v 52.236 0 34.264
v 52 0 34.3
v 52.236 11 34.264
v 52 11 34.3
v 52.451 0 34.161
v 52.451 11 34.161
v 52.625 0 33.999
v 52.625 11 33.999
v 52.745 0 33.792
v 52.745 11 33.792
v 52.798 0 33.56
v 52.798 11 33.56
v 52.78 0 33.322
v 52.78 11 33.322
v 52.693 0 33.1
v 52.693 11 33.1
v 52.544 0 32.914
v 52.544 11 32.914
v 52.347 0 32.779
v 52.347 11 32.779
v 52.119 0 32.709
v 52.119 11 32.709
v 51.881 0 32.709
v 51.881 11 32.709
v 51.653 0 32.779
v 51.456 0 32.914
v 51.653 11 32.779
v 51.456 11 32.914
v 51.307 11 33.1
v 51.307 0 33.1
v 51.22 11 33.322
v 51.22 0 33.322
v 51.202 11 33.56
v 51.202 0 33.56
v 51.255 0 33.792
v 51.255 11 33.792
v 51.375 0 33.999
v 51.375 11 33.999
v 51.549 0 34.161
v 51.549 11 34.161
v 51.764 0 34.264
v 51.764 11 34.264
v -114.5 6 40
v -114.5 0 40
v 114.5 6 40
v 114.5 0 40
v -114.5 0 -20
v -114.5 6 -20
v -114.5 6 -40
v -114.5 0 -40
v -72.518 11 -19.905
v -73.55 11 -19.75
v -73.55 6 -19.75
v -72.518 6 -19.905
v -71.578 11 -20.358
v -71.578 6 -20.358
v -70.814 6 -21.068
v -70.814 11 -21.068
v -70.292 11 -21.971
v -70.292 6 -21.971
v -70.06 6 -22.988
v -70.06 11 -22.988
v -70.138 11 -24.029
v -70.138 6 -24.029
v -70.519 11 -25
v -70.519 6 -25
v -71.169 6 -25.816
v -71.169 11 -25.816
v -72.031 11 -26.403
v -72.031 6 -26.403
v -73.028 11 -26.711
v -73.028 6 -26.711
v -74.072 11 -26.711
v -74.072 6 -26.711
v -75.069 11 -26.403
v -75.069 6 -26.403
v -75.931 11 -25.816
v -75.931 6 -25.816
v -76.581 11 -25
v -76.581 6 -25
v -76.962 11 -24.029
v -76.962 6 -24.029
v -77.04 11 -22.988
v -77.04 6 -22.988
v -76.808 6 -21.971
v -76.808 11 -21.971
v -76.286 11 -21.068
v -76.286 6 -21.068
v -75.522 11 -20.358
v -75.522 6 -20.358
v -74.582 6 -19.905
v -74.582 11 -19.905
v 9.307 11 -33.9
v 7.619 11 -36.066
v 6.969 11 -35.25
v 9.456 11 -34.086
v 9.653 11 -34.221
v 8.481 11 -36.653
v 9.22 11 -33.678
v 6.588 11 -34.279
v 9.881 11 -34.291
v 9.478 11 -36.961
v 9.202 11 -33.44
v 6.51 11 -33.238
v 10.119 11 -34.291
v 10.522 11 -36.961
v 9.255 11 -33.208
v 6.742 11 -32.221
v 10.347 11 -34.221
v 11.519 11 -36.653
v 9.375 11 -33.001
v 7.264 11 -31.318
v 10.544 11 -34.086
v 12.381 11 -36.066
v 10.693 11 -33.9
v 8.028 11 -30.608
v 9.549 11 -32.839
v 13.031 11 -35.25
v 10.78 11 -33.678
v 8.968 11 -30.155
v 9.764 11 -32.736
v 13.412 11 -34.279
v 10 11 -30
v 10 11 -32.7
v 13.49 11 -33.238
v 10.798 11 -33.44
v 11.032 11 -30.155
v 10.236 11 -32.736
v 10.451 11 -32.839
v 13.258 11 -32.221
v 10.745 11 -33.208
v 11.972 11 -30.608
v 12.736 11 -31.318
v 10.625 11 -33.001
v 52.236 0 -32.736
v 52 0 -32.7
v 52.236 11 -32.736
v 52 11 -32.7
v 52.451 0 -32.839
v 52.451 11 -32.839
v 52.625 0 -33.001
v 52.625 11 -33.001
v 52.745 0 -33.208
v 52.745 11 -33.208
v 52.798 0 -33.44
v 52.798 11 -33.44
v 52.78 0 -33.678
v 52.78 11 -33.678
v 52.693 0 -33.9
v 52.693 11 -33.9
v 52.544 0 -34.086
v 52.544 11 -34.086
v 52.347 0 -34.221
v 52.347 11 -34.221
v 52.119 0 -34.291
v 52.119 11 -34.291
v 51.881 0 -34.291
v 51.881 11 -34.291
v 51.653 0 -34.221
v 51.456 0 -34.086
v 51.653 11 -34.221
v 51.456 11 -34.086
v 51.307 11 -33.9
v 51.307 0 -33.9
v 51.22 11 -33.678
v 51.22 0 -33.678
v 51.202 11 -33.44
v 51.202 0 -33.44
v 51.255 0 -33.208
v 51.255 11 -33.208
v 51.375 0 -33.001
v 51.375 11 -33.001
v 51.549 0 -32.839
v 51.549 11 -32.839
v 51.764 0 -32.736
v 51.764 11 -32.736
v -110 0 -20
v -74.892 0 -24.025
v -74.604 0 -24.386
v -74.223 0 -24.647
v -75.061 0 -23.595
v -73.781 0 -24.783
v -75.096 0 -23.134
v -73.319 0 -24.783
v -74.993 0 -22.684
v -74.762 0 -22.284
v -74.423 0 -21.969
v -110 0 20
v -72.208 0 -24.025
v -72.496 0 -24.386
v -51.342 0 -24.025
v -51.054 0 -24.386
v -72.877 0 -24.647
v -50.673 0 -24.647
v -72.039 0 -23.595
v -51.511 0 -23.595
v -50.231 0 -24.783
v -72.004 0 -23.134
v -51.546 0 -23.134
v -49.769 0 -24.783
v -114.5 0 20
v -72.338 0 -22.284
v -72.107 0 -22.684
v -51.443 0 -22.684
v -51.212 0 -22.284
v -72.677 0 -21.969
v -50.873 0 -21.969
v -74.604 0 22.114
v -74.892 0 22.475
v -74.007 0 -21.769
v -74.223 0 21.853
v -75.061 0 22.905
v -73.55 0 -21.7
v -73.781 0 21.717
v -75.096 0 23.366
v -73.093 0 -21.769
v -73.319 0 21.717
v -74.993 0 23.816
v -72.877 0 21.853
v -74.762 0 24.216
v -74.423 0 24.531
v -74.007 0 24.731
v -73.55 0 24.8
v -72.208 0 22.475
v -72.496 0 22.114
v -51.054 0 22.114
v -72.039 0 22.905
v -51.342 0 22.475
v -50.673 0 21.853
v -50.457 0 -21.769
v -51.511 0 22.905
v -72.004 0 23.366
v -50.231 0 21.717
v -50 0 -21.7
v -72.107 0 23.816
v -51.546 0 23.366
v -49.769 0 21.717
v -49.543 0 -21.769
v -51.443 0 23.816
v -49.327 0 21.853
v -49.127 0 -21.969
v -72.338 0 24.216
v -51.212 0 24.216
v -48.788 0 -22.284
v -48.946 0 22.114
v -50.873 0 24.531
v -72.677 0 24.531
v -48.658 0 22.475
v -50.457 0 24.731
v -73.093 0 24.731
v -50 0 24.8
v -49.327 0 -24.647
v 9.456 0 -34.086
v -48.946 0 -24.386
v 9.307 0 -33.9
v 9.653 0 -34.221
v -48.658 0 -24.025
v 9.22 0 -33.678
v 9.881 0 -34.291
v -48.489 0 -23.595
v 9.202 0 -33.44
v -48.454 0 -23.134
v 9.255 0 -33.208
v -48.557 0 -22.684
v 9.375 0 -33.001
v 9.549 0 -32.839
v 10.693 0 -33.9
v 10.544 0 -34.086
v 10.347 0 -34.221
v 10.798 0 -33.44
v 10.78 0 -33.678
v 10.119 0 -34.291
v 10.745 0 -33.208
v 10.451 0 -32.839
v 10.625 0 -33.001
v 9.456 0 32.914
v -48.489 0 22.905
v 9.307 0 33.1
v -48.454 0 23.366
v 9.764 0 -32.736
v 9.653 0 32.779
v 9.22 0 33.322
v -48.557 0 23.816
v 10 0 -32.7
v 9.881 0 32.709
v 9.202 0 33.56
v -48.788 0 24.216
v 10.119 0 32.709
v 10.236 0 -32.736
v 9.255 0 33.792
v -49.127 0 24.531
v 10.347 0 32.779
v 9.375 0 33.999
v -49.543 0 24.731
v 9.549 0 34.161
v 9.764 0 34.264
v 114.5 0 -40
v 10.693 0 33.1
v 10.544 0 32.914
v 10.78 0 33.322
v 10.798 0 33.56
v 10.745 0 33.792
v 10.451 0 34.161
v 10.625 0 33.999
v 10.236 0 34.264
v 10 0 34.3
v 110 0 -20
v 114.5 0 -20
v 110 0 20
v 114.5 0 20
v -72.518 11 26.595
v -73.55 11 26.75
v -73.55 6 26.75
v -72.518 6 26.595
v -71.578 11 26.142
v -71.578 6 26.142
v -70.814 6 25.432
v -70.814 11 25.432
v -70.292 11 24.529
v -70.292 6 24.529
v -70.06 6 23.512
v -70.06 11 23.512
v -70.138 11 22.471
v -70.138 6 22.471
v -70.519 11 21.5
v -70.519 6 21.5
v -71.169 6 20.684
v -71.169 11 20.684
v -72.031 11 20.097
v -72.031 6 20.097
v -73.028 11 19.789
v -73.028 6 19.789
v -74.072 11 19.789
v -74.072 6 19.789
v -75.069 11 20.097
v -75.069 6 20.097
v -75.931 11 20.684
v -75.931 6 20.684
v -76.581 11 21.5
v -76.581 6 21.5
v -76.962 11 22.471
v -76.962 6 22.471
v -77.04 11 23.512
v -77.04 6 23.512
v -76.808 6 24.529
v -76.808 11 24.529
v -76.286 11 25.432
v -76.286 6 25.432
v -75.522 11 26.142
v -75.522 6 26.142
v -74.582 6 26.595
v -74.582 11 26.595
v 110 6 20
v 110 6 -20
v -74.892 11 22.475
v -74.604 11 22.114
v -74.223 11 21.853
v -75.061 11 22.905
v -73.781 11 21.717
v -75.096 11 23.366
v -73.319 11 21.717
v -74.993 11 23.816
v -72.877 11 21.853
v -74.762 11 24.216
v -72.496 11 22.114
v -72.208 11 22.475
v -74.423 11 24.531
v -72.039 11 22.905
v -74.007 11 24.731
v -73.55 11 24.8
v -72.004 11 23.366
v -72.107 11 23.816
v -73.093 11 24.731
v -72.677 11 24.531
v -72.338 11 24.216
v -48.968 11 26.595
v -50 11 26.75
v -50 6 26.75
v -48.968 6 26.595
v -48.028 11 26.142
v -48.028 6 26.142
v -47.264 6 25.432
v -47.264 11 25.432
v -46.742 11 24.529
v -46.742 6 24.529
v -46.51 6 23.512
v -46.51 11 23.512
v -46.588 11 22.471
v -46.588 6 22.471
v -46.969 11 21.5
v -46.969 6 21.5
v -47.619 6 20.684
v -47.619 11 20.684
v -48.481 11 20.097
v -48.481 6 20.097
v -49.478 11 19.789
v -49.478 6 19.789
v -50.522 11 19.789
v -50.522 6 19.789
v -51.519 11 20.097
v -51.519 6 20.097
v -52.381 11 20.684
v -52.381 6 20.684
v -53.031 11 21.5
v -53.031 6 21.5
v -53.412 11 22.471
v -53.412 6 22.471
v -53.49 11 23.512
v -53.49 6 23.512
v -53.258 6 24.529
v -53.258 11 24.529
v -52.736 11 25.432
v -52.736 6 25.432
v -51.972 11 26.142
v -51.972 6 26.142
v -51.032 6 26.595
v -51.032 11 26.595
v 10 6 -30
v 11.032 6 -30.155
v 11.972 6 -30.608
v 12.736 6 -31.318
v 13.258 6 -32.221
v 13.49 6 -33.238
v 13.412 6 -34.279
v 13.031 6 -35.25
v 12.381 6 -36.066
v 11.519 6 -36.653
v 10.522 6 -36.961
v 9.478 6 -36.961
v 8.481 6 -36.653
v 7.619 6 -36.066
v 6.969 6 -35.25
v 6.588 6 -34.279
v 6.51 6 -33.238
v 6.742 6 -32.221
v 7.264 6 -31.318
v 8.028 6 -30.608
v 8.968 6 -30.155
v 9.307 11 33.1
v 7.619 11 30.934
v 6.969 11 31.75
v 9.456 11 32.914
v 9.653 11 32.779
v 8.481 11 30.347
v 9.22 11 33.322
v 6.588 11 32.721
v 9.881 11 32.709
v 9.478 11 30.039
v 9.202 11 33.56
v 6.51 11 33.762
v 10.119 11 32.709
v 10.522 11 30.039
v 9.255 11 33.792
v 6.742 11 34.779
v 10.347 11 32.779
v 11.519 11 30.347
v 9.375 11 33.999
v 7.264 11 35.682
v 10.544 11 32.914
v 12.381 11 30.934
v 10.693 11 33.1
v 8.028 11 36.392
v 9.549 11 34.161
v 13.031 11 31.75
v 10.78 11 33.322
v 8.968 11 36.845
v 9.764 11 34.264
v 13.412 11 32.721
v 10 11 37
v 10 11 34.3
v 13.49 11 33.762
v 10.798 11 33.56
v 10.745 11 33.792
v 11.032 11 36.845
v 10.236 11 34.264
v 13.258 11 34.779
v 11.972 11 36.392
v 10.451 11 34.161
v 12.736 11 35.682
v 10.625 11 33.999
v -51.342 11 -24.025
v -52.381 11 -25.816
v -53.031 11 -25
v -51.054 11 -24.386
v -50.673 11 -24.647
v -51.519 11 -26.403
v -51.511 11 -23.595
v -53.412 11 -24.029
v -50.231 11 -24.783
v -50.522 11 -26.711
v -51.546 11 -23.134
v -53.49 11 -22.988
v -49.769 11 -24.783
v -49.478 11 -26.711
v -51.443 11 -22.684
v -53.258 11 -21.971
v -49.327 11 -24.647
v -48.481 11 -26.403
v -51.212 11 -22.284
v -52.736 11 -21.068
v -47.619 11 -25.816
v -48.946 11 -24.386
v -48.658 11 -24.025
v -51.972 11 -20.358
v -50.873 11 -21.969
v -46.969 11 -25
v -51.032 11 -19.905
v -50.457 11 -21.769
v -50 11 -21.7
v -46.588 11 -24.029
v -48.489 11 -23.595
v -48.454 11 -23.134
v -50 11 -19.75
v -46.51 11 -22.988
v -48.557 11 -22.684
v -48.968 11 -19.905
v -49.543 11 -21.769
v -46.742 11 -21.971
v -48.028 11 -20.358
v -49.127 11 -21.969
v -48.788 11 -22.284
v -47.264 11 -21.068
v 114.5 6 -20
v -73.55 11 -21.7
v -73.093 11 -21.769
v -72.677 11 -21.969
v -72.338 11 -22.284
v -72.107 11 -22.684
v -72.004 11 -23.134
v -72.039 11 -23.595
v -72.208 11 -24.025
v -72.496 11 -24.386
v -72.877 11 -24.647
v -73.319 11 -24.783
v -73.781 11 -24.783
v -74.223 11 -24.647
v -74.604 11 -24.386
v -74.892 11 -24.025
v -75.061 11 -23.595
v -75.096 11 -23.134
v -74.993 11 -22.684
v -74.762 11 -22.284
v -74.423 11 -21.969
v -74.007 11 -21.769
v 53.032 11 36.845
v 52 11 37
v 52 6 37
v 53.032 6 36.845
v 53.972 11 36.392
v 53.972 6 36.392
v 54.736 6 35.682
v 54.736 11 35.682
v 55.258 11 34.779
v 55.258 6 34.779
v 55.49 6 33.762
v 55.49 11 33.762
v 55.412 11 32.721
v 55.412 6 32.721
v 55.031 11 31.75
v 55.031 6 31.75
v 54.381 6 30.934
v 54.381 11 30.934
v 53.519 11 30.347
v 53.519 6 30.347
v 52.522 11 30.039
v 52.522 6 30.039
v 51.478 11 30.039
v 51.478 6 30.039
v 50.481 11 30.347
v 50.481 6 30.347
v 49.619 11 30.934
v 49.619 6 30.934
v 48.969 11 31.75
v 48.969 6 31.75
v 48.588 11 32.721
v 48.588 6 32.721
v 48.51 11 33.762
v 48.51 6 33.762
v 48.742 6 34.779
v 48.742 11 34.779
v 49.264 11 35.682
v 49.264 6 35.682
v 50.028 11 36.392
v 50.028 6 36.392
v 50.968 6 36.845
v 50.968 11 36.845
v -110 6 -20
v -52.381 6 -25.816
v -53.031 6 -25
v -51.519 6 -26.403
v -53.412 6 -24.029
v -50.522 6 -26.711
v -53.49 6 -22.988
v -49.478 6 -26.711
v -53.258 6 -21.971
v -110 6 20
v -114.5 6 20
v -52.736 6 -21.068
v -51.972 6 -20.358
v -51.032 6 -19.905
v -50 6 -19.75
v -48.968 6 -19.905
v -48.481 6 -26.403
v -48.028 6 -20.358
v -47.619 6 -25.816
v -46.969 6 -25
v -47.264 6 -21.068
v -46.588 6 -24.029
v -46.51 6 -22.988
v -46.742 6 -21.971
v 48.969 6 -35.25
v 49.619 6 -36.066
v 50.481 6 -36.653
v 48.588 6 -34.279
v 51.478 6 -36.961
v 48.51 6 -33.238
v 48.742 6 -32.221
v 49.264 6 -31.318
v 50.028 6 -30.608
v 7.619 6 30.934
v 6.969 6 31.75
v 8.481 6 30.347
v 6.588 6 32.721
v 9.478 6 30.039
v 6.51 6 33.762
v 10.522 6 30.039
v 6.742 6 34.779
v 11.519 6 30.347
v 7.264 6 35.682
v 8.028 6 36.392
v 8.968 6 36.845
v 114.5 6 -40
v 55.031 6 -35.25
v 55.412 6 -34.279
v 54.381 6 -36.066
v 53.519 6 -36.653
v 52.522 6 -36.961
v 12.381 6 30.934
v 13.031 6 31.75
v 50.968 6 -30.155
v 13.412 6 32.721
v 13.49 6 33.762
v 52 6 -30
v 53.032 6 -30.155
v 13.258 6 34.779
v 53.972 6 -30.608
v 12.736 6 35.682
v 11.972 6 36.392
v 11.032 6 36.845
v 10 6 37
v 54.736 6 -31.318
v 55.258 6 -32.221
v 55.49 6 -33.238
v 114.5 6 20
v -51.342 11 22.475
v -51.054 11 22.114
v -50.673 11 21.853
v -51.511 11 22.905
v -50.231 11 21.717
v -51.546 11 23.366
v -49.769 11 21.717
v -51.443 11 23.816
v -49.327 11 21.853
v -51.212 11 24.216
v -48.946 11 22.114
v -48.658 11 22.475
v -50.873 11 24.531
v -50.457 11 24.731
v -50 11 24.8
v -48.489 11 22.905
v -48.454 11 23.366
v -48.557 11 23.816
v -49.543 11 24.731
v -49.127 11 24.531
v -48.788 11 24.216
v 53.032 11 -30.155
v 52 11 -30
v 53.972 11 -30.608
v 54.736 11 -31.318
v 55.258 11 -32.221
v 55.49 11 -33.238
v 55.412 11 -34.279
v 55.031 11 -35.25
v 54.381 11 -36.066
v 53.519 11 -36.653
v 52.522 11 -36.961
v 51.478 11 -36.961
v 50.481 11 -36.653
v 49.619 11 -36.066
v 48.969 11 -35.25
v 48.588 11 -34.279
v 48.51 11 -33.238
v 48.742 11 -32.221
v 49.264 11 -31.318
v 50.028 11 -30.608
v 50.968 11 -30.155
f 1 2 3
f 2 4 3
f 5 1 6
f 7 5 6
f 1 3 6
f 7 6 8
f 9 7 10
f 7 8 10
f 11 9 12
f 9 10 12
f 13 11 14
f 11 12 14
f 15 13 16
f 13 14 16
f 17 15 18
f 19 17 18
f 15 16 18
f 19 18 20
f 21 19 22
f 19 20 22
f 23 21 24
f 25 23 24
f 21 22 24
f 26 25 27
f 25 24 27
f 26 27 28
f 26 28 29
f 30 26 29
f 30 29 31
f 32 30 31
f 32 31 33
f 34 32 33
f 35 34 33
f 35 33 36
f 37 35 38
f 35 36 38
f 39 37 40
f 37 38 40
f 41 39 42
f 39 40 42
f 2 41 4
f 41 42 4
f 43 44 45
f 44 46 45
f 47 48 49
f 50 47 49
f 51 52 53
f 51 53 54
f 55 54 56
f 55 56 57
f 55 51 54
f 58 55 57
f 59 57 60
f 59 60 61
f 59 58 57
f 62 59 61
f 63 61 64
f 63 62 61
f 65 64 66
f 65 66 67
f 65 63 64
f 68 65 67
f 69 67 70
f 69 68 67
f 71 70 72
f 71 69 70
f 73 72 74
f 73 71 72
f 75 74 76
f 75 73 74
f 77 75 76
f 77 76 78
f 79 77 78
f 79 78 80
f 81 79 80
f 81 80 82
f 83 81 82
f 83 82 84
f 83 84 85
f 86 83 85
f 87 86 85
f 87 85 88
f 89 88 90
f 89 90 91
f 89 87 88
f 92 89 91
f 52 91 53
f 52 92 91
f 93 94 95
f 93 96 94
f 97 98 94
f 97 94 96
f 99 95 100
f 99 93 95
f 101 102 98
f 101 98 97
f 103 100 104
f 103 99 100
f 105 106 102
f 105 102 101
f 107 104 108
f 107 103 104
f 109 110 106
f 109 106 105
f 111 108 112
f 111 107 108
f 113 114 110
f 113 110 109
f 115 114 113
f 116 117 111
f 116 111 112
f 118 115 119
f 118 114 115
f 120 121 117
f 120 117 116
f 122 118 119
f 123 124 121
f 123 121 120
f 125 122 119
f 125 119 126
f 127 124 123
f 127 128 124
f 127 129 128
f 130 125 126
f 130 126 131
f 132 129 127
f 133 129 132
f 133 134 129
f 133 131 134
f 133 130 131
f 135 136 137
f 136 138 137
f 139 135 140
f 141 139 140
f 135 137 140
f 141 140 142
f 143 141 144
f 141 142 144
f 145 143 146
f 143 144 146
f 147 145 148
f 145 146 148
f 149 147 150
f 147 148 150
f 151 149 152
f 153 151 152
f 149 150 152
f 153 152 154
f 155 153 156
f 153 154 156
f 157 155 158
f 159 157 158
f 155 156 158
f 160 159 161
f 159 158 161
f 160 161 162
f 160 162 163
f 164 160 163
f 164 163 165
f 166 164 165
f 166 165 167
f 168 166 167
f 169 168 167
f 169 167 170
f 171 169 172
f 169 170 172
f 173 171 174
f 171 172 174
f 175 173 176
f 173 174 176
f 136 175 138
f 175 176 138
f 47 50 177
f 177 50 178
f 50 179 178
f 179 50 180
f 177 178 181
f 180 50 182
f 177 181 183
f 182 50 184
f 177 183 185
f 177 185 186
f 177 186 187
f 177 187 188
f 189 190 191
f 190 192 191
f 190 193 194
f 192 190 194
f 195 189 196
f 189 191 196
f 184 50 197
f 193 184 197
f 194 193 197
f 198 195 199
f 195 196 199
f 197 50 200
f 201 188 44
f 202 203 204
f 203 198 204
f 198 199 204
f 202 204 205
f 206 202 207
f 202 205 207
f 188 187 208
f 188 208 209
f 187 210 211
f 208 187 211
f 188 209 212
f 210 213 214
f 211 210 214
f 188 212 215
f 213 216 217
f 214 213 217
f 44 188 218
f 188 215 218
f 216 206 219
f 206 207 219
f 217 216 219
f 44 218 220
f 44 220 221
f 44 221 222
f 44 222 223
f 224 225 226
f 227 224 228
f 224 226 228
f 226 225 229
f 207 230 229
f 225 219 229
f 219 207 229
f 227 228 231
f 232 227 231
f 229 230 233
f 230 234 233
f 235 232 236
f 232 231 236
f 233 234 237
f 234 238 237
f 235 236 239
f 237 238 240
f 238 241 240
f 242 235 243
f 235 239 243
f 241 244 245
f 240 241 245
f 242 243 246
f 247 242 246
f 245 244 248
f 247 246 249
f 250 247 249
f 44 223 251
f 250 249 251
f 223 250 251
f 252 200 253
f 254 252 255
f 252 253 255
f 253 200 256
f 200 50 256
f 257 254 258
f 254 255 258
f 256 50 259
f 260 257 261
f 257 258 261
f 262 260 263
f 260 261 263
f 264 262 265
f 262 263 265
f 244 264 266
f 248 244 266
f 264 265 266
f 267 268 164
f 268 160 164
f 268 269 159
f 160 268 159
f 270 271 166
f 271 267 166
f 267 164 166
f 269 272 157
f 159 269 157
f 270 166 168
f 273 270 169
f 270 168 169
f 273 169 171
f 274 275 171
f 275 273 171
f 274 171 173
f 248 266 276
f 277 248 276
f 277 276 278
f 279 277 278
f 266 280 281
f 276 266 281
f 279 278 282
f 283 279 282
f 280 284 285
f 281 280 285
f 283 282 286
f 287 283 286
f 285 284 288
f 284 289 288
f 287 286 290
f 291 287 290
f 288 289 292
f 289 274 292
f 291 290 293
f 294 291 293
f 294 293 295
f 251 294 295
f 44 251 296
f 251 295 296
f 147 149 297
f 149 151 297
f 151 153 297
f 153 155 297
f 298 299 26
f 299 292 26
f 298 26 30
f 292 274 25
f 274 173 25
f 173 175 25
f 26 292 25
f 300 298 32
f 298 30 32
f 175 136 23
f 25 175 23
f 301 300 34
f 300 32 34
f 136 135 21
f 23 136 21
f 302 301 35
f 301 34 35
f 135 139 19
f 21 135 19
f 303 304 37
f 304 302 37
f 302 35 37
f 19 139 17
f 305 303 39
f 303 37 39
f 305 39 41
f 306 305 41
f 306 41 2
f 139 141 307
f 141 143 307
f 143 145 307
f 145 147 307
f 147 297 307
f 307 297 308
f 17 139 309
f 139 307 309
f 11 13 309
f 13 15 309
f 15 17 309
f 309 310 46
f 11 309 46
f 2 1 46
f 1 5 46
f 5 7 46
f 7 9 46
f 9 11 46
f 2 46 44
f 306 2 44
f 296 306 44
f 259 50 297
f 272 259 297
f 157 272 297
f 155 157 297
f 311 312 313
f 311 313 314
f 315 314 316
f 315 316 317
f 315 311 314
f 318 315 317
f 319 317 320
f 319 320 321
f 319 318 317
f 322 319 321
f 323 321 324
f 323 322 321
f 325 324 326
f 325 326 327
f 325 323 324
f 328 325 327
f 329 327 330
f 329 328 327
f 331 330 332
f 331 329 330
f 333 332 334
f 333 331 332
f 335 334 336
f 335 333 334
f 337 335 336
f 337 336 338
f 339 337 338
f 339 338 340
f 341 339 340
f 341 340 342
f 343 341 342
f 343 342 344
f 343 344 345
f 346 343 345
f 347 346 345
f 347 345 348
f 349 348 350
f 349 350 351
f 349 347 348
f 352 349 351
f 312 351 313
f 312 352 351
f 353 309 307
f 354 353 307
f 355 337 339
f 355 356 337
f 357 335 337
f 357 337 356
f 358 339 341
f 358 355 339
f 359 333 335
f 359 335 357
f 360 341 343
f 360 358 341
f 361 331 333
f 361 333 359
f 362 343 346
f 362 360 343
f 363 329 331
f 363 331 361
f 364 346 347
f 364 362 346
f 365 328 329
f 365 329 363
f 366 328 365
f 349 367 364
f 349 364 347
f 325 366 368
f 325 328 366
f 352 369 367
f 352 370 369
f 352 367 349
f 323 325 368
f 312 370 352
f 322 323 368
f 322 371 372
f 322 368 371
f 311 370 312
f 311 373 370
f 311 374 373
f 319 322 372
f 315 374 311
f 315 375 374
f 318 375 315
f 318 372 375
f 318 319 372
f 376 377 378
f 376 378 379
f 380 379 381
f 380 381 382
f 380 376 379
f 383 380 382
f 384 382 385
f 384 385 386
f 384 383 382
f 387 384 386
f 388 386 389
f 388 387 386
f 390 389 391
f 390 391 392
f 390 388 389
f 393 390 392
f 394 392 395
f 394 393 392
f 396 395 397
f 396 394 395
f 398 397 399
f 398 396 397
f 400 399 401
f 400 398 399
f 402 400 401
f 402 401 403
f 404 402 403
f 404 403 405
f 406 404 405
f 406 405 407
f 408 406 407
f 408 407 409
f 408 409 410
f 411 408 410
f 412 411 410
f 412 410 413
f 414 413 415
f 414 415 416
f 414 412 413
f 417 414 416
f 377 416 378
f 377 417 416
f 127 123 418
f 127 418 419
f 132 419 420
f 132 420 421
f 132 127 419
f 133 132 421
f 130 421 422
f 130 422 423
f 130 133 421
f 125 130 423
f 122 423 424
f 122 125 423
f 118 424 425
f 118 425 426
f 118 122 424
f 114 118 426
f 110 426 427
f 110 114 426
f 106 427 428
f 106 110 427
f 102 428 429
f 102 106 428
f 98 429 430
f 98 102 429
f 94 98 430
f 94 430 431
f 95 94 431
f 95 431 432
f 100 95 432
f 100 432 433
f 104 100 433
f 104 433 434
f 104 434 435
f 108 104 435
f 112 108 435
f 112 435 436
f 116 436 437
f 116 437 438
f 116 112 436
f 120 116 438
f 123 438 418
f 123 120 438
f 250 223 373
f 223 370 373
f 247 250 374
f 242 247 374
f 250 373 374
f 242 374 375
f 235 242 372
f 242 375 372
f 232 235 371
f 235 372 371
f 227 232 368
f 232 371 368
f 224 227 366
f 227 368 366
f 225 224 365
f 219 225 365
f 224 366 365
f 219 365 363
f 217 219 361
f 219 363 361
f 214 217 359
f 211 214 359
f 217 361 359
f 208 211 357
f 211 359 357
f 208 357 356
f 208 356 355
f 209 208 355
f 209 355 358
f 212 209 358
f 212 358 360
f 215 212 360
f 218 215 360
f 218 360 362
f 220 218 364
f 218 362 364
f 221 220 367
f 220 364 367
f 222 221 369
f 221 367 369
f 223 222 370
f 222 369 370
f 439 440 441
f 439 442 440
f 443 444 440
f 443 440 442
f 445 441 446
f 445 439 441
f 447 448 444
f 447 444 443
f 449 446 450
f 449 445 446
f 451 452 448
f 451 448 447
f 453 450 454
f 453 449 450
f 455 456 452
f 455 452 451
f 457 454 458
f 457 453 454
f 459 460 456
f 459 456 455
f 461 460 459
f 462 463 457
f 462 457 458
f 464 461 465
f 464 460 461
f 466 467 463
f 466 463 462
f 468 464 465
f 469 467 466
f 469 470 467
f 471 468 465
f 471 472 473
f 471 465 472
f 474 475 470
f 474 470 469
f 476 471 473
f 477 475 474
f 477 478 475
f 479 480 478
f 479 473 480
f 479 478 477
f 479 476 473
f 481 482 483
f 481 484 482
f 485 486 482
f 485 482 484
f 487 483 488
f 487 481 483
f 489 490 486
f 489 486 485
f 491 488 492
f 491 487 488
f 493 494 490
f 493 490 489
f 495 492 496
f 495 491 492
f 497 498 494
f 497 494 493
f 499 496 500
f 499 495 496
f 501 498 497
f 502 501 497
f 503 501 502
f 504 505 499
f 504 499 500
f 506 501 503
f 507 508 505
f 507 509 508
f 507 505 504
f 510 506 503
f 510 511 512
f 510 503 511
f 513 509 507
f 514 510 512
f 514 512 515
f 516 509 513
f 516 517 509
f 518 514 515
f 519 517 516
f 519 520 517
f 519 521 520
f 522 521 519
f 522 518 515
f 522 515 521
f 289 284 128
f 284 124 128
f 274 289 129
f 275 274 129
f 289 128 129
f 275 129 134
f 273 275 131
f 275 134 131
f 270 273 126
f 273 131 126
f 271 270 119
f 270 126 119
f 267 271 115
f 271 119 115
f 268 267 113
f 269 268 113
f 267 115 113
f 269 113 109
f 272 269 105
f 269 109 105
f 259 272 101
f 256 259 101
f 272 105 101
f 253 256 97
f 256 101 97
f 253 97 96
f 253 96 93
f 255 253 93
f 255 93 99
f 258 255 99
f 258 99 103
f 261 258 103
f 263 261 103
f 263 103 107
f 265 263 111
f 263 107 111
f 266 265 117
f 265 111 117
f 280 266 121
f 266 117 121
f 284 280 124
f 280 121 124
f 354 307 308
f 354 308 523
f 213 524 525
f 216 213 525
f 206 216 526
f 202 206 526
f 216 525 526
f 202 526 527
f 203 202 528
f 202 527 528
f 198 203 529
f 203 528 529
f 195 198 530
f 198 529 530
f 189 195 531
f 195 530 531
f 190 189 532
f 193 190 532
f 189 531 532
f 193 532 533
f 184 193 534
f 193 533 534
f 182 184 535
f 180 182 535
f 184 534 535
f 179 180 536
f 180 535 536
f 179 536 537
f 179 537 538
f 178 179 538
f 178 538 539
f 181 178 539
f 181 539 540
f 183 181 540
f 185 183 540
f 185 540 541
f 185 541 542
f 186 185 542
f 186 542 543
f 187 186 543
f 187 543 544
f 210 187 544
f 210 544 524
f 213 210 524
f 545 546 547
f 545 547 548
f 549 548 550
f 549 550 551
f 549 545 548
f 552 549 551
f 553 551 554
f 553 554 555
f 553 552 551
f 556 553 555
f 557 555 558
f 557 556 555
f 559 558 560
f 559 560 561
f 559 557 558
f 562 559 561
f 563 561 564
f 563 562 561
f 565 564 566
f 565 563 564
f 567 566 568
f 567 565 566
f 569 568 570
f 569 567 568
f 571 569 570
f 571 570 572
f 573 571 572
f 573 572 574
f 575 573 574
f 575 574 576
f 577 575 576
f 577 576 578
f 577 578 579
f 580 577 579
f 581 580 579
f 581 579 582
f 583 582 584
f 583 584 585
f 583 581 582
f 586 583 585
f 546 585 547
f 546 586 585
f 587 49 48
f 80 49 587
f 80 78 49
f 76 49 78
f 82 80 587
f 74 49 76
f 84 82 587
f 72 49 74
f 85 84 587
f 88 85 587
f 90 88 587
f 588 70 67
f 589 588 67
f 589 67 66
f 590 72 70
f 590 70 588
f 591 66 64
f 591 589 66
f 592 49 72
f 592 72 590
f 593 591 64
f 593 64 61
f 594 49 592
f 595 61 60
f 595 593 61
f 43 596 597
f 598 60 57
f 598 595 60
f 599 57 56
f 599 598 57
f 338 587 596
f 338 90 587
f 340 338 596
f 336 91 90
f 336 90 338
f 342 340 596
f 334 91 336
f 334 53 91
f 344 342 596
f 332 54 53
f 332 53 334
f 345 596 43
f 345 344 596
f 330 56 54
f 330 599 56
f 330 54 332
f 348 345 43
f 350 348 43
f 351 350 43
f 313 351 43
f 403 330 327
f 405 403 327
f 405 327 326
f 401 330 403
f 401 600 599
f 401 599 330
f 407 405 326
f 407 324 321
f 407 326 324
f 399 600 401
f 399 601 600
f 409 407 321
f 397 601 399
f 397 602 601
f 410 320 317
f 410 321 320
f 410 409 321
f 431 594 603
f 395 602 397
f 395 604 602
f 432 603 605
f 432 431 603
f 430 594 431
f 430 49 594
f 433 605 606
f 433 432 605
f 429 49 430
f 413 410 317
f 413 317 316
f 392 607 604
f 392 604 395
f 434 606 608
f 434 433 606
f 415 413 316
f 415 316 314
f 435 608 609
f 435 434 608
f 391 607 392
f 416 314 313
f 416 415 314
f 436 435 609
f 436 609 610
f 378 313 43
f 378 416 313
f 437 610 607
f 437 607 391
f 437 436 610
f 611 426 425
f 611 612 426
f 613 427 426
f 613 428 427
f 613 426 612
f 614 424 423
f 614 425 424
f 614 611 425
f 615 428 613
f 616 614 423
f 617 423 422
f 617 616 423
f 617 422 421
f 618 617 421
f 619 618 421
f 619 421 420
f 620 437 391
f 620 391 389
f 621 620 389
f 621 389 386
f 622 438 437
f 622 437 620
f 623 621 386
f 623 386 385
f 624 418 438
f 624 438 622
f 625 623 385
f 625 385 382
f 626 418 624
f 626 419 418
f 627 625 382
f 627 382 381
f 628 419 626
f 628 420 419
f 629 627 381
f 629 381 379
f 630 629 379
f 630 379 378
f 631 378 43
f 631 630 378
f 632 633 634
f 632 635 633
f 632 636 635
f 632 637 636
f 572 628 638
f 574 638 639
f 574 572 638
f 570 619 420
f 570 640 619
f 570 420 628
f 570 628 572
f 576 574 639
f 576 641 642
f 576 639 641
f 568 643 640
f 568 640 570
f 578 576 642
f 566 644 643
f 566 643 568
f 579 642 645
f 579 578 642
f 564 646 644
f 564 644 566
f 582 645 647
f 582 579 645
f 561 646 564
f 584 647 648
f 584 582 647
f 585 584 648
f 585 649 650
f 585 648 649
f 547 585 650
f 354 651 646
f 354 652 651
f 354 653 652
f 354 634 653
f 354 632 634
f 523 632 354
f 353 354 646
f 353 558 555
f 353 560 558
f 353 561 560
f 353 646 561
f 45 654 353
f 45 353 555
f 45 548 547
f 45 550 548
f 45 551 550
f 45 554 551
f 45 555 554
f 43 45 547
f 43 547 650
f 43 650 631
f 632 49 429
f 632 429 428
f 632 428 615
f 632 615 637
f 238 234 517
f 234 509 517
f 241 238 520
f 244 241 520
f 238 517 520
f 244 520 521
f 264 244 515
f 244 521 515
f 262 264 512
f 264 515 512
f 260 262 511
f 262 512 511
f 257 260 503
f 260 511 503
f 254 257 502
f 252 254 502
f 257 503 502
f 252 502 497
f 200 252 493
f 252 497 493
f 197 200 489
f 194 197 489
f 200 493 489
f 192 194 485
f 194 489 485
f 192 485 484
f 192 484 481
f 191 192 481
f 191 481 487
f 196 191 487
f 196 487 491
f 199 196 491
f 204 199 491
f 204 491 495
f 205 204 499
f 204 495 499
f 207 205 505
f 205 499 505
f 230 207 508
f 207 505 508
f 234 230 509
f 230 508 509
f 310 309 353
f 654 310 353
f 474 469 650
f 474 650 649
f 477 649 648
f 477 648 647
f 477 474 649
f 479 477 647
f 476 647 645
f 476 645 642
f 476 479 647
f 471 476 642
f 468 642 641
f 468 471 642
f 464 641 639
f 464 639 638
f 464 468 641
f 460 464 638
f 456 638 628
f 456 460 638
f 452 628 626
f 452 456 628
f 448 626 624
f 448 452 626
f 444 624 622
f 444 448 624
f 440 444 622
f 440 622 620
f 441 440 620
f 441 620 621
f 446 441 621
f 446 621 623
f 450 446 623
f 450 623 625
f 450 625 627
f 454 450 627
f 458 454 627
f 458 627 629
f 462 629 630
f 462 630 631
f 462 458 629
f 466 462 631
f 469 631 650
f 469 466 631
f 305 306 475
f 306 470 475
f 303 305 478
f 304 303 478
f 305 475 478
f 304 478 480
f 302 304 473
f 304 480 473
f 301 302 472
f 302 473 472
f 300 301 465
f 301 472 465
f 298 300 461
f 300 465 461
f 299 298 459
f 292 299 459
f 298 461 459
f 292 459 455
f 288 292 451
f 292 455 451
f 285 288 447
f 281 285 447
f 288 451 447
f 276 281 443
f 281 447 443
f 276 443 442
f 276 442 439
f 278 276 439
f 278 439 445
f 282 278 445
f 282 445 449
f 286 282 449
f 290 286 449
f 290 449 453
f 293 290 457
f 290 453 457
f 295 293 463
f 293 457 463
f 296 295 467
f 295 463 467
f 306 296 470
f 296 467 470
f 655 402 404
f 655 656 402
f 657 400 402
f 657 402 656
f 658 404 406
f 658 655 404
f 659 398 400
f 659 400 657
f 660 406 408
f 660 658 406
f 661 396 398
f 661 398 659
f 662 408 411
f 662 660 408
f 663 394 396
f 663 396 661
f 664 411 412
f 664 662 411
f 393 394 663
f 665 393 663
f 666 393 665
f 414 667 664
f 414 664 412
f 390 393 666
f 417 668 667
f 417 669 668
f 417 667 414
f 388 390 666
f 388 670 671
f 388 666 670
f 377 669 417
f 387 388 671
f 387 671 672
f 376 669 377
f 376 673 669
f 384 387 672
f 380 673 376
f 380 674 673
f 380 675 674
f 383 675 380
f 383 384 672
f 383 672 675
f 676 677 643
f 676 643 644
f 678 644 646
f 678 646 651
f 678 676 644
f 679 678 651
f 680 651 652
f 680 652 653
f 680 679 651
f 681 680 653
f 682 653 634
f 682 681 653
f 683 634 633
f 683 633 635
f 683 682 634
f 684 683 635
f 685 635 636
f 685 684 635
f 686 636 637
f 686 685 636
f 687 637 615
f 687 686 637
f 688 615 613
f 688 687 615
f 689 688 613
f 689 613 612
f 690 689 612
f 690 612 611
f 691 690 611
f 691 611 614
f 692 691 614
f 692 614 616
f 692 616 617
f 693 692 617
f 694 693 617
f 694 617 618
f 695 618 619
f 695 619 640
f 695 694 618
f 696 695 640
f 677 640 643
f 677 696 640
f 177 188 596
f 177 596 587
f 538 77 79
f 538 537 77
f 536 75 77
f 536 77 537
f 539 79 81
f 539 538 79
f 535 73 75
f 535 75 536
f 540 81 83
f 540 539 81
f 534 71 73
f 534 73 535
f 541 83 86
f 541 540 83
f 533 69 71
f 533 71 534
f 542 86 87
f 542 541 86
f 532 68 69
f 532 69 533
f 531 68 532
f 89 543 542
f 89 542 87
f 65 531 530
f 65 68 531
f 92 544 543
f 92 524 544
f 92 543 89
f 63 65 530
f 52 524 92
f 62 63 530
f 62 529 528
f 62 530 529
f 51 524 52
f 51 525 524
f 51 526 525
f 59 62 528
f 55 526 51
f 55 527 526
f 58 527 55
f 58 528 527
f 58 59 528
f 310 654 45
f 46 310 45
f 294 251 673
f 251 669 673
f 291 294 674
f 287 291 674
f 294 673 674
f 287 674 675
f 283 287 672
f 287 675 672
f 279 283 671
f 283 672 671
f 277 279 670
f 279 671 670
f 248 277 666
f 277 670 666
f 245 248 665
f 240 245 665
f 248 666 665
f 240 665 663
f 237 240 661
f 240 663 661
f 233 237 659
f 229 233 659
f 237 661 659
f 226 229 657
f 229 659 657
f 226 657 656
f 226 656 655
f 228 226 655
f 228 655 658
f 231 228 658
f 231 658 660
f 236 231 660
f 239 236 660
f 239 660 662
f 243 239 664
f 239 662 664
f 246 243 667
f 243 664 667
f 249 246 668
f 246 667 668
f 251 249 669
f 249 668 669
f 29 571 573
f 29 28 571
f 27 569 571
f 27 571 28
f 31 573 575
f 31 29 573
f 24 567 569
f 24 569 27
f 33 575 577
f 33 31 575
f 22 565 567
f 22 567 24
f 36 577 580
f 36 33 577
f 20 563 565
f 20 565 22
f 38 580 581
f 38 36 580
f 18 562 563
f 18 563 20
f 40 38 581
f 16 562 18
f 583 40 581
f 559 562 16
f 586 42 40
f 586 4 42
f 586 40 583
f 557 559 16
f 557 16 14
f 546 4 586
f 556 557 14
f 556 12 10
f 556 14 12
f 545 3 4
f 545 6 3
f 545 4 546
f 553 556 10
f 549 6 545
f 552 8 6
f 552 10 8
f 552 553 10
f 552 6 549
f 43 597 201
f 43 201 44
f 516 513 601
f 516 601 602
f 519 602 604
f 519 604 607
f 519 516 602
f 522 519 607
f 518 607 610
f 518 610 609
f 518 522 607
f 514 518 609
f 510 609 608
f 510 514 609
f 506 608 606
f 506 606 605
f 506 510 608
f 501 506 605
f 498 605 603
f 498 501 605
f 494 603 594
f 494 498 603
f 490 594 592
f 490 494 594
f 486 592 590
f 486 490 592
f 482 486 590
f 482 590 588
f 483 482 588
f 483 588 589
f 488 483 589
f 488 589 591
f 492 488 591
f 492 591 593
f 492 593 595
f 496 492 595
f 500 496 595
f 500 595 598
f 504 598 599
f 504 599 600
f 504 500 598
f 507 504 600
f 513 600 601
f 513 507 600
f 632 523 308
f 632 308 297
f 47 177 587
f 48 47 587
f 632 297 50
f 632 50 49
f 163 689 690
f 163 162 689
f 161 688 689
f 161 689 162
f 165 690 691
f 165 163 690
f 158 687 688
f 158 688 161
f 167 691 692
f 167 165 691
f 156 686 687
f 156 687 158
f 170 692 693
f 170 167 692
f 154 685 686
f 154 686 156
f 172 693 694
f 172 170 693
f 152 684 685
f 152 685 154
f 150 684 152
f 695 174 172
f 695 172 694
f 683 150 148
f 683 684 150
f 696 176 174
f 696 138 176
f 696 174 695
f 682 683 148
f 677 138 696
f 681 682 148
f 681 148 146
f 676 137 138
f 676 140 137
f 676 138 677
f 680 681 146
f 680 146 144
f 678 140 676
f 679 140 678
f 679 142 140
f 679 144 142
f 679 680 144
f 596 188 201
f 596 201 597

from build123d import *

# Parameters (mm, degrees)
SKETCH2_W                                  = 220
SKETCH2_H                                  = 80
MAIN_DEPTH                                 = 6
SKETCH3_W                                  = 20
SKETCH3_H                                  = 6
TAB_DEPTH                                  = 4.5
MIRROR1_AT_THE_SECOND_PLANE_COPY_1_SKETC_W = 20
MIRROR1_AT_THE_SECOND_PLANE_COPY_1_SKETC_H = 6
MIRROR1_AT_THE_SECOND_PLANE_COPY_1_DEPTH   = 4.5
SKETCH4_R                                  = 0.8
SKETCH4_R_2                                = 1.55
PCB_HOLES_DEPTH                            = 122.434138528
PCB_START                                  = 5
SKETCH5_R                                  = 3.5
SKETCH5_R_2                                = 1.55
SKETCH5_R_3                                = 0.8
PCB_PEGS_DEPTH                             = 5


with BuildPart() as part:
    # Sketch2 → Main (new body)
    with BuildSketch(Plane(origin=(0, 0, 0), x_dir=(1, 0, 0), z_dir=(0, 1, 0))):
        Rectangle(SKETCH2_W, SKETCH2_H)
    extrude(amount=MAIN_DEPTH)

    # Sketch3 → Tab (add)
    with BuildSketch(Plane(origin=(110, 0, 0), x_dir=(0, 0, -1), z_dir=(1, 0, 0))):
        with Locations((30, 3)):
            Rectangle(SKETCH3_W, SKETCH3_H)
    tab = extrude(amount=TAB_DEPTH)

    # Mirror1: Tab across plane
    add(tab.mirror(Plane(origin=(0, 0, 0), x_dir=(0, 0, 1), z_dir=(1, 0, 0))))

    # Mirror1 at the second plane: Tab across plane
    add(tab.mirror(Plane.XY))

    # Mirror1 at the second plane copy 1 sketc → Mirror1 at the second plane copy 1 (add)
    with BuildSketch(Plane.ZY.offset(110)):
        with Locations((30, 3)):
            Rectangle(MIRROR1_AT_THE_SECOND_PLANE_COPY_1_SKETC_W, MIRROR1_AT_THE_SECOND_PLANE_COPY_1_SKETC_H)
    extrude(amount=MIRROR1_AT_THE_SECOND_PLANE_COPY_1_DEPTH)

    # Sketch4 → PCB holes (cut, through all)
    with BuildSketch(Plane(origin=(0, 6, 0), x_dir=(1, 0, 0), z_dir=(0, 1, 0))):
        with Locations(Location((10, 33.5, 0), (0, 0, 270))):
            Circle(SKETCH4_R)
        with Locations(Location((52, 33.5, 0), (0, 0, 270))):
            Circle(SKETCH4_R)
        with Locations(Location((52, -33.5, 0), (0, 0, 270))):
            Circle(SKETCH4_R)
        with Locations(Location((10, -33.5, 0), (0, 0, 270))):
            Circle(SKETCH4_R)
        with Locations(Location((-73.55, 23.25, 0), (0, 0, 270))):
            Circle(SKETCH4_R_2)
        with Locations(Location((-50, 23.25, 0), (0, 0, 270))):
            Circle(SKETCH4_R_2)
        with Locations(Location((-50, -23.25, 0), (0, 0, 270))):
            Circle(SKETCH4_R_2)
        with Locations(Location((-73.55, -23.25, 0), (0, 0, 270))):
            Circle(SKETCH4_R_2)
    extrude(amount=-PCB_HOLES_DEPTH, mode=Mode.SUBTRACT)

    # Sketch5 → PCB pegs (add)
    # profile 1 of 8: a face of its own
    with BuildSketch(Plane(origin=(0, 6, 0), x_dir=(1, 0, 0), z_dir=(0, 1, 0)).offset(PCB_START)):
        with Locations(Location((-73.55, 23.25, 0), (0, 0, 270))):
            Circle(SKETCH5_R)
        with Locations(Location((-73.55, 23.25, 0), (0, 0, 270))):
            Circle(SKETCH5_R_2, mode=Mode.SUBTRACT)
    # profile 2 of 8: a face of its own
    with BuildSketch(Plane(origin=(0, 6, 0), x_dir=(1, 0, 0), z_dir=(0, 1, 0)).offset(PCB_START)):
        with Locations(Location((-50, 23.25, 0), (0, 0, 270))):
            Circle(SKETCH5_R)
        with Locations(Location((-50, 23.25, 0), (0, 0, 270))):
            Circle(SKETCH5_R_2, mode=Mode.SUBTRACT)
    # profile 3 of 8: a face of its own
    with BuildSketch(Plane(origin=(0, 6, 0), x_dir=(1, 0, 0), z_dir=(0, 1, 0)).offset(PCB_START)):
        with Locations(Location((-73.55, -23.25, 0), (0, 0, 270))):
            Circle(SKETCH5_R)
        with Locations(Location((-73.55, -23.25, 0), (0, 0, 270))):
            Circle(SKETCH5_R_2, mode=Mode.SUBTRACT)
    # profile 4 of 8: a face of its own
    with BuildSketch(Plane(origin=(0, 6, 0), x_dir=(1, 0, 0), z_dir=(0, 1, 0)).offset(PCB_START)):
        with Locations(Location((-50, -23.25, 0), (0, 0, 270))):
            Circle(SKETCH5_R)
        with Locations(Location((-50, -23.25, 0), (0, 0, 270))):
            Circle(SKETCH5_R_2, mode=Mode.SUBTRACT)
    # profile 5 of 8: a face of its own
    with BuildSketch(Plane(origin=(0, 6, 0), x_dir=(1, 0, 0), z_dir=(0, 1, 0)).offset(PCB_START)):
        with Locations(Location((10, -33.5, 0), (0, 0, 270))):
            Circle(SKETCH5_R)
        with Locations(Location((10, -33.5, 0), (0, 0, 270))):
            Circle(SKETCH5_R_3, mode=Mode.SUBTRACT)
    # profile 6 of 8: a face of its own
    with BuildSketch(Plane(origin=(0, 6, 0), x_dir=(1, 0, 0), z_dir=(0, 1, 0)).offset(PCB_START)):
        with Locations(Location((52, -33.5, 0), (0, 0, 270))):
            Circle(SKETCH5_R)
        with Locations(Location((52, -33.5, 0), (0, 0, 270))):
            Circle(SKETCH5_R_3, mode=Mode.SUBTRACT)
    # profile 7 of 8: a face of its own
    with BuildSketch(Plane(origin=(0, 6, 0), x_dir=(1, 0, 0), z_dir=(0, 1, 0)).offset(PCB_START)):
        with Locations(Location((52, 33.5, 0), (0, 0, 270))):
            Circle(SKETCH5_R)
        with Locations(Location((52, 33.5, 0), (0, 0, 270))):
            Circle(SKETCH5_R_3, mode=Mode.SUBTRACT)
    # profile 8 of 8: a face of its own
    with BuildSketch(Plane(origin=(0, 6, 0), x_dir=(1, 0, 0), z_dir=(0, 1, 0)).offset(PCB_START)):
        with Locations(Location((10, 33.5, 0), (0, 0, 270))):
            Circle(SKETCH5_R)
        with Locations(Location((10, 33.5, 0), (0, 0, 270))):
            Circle(SKETCH5_R_3, mode=Mode.SUBTRACT)
    extrude(amount=-PCB_PEGS_DEPTH)


solid = part.part
